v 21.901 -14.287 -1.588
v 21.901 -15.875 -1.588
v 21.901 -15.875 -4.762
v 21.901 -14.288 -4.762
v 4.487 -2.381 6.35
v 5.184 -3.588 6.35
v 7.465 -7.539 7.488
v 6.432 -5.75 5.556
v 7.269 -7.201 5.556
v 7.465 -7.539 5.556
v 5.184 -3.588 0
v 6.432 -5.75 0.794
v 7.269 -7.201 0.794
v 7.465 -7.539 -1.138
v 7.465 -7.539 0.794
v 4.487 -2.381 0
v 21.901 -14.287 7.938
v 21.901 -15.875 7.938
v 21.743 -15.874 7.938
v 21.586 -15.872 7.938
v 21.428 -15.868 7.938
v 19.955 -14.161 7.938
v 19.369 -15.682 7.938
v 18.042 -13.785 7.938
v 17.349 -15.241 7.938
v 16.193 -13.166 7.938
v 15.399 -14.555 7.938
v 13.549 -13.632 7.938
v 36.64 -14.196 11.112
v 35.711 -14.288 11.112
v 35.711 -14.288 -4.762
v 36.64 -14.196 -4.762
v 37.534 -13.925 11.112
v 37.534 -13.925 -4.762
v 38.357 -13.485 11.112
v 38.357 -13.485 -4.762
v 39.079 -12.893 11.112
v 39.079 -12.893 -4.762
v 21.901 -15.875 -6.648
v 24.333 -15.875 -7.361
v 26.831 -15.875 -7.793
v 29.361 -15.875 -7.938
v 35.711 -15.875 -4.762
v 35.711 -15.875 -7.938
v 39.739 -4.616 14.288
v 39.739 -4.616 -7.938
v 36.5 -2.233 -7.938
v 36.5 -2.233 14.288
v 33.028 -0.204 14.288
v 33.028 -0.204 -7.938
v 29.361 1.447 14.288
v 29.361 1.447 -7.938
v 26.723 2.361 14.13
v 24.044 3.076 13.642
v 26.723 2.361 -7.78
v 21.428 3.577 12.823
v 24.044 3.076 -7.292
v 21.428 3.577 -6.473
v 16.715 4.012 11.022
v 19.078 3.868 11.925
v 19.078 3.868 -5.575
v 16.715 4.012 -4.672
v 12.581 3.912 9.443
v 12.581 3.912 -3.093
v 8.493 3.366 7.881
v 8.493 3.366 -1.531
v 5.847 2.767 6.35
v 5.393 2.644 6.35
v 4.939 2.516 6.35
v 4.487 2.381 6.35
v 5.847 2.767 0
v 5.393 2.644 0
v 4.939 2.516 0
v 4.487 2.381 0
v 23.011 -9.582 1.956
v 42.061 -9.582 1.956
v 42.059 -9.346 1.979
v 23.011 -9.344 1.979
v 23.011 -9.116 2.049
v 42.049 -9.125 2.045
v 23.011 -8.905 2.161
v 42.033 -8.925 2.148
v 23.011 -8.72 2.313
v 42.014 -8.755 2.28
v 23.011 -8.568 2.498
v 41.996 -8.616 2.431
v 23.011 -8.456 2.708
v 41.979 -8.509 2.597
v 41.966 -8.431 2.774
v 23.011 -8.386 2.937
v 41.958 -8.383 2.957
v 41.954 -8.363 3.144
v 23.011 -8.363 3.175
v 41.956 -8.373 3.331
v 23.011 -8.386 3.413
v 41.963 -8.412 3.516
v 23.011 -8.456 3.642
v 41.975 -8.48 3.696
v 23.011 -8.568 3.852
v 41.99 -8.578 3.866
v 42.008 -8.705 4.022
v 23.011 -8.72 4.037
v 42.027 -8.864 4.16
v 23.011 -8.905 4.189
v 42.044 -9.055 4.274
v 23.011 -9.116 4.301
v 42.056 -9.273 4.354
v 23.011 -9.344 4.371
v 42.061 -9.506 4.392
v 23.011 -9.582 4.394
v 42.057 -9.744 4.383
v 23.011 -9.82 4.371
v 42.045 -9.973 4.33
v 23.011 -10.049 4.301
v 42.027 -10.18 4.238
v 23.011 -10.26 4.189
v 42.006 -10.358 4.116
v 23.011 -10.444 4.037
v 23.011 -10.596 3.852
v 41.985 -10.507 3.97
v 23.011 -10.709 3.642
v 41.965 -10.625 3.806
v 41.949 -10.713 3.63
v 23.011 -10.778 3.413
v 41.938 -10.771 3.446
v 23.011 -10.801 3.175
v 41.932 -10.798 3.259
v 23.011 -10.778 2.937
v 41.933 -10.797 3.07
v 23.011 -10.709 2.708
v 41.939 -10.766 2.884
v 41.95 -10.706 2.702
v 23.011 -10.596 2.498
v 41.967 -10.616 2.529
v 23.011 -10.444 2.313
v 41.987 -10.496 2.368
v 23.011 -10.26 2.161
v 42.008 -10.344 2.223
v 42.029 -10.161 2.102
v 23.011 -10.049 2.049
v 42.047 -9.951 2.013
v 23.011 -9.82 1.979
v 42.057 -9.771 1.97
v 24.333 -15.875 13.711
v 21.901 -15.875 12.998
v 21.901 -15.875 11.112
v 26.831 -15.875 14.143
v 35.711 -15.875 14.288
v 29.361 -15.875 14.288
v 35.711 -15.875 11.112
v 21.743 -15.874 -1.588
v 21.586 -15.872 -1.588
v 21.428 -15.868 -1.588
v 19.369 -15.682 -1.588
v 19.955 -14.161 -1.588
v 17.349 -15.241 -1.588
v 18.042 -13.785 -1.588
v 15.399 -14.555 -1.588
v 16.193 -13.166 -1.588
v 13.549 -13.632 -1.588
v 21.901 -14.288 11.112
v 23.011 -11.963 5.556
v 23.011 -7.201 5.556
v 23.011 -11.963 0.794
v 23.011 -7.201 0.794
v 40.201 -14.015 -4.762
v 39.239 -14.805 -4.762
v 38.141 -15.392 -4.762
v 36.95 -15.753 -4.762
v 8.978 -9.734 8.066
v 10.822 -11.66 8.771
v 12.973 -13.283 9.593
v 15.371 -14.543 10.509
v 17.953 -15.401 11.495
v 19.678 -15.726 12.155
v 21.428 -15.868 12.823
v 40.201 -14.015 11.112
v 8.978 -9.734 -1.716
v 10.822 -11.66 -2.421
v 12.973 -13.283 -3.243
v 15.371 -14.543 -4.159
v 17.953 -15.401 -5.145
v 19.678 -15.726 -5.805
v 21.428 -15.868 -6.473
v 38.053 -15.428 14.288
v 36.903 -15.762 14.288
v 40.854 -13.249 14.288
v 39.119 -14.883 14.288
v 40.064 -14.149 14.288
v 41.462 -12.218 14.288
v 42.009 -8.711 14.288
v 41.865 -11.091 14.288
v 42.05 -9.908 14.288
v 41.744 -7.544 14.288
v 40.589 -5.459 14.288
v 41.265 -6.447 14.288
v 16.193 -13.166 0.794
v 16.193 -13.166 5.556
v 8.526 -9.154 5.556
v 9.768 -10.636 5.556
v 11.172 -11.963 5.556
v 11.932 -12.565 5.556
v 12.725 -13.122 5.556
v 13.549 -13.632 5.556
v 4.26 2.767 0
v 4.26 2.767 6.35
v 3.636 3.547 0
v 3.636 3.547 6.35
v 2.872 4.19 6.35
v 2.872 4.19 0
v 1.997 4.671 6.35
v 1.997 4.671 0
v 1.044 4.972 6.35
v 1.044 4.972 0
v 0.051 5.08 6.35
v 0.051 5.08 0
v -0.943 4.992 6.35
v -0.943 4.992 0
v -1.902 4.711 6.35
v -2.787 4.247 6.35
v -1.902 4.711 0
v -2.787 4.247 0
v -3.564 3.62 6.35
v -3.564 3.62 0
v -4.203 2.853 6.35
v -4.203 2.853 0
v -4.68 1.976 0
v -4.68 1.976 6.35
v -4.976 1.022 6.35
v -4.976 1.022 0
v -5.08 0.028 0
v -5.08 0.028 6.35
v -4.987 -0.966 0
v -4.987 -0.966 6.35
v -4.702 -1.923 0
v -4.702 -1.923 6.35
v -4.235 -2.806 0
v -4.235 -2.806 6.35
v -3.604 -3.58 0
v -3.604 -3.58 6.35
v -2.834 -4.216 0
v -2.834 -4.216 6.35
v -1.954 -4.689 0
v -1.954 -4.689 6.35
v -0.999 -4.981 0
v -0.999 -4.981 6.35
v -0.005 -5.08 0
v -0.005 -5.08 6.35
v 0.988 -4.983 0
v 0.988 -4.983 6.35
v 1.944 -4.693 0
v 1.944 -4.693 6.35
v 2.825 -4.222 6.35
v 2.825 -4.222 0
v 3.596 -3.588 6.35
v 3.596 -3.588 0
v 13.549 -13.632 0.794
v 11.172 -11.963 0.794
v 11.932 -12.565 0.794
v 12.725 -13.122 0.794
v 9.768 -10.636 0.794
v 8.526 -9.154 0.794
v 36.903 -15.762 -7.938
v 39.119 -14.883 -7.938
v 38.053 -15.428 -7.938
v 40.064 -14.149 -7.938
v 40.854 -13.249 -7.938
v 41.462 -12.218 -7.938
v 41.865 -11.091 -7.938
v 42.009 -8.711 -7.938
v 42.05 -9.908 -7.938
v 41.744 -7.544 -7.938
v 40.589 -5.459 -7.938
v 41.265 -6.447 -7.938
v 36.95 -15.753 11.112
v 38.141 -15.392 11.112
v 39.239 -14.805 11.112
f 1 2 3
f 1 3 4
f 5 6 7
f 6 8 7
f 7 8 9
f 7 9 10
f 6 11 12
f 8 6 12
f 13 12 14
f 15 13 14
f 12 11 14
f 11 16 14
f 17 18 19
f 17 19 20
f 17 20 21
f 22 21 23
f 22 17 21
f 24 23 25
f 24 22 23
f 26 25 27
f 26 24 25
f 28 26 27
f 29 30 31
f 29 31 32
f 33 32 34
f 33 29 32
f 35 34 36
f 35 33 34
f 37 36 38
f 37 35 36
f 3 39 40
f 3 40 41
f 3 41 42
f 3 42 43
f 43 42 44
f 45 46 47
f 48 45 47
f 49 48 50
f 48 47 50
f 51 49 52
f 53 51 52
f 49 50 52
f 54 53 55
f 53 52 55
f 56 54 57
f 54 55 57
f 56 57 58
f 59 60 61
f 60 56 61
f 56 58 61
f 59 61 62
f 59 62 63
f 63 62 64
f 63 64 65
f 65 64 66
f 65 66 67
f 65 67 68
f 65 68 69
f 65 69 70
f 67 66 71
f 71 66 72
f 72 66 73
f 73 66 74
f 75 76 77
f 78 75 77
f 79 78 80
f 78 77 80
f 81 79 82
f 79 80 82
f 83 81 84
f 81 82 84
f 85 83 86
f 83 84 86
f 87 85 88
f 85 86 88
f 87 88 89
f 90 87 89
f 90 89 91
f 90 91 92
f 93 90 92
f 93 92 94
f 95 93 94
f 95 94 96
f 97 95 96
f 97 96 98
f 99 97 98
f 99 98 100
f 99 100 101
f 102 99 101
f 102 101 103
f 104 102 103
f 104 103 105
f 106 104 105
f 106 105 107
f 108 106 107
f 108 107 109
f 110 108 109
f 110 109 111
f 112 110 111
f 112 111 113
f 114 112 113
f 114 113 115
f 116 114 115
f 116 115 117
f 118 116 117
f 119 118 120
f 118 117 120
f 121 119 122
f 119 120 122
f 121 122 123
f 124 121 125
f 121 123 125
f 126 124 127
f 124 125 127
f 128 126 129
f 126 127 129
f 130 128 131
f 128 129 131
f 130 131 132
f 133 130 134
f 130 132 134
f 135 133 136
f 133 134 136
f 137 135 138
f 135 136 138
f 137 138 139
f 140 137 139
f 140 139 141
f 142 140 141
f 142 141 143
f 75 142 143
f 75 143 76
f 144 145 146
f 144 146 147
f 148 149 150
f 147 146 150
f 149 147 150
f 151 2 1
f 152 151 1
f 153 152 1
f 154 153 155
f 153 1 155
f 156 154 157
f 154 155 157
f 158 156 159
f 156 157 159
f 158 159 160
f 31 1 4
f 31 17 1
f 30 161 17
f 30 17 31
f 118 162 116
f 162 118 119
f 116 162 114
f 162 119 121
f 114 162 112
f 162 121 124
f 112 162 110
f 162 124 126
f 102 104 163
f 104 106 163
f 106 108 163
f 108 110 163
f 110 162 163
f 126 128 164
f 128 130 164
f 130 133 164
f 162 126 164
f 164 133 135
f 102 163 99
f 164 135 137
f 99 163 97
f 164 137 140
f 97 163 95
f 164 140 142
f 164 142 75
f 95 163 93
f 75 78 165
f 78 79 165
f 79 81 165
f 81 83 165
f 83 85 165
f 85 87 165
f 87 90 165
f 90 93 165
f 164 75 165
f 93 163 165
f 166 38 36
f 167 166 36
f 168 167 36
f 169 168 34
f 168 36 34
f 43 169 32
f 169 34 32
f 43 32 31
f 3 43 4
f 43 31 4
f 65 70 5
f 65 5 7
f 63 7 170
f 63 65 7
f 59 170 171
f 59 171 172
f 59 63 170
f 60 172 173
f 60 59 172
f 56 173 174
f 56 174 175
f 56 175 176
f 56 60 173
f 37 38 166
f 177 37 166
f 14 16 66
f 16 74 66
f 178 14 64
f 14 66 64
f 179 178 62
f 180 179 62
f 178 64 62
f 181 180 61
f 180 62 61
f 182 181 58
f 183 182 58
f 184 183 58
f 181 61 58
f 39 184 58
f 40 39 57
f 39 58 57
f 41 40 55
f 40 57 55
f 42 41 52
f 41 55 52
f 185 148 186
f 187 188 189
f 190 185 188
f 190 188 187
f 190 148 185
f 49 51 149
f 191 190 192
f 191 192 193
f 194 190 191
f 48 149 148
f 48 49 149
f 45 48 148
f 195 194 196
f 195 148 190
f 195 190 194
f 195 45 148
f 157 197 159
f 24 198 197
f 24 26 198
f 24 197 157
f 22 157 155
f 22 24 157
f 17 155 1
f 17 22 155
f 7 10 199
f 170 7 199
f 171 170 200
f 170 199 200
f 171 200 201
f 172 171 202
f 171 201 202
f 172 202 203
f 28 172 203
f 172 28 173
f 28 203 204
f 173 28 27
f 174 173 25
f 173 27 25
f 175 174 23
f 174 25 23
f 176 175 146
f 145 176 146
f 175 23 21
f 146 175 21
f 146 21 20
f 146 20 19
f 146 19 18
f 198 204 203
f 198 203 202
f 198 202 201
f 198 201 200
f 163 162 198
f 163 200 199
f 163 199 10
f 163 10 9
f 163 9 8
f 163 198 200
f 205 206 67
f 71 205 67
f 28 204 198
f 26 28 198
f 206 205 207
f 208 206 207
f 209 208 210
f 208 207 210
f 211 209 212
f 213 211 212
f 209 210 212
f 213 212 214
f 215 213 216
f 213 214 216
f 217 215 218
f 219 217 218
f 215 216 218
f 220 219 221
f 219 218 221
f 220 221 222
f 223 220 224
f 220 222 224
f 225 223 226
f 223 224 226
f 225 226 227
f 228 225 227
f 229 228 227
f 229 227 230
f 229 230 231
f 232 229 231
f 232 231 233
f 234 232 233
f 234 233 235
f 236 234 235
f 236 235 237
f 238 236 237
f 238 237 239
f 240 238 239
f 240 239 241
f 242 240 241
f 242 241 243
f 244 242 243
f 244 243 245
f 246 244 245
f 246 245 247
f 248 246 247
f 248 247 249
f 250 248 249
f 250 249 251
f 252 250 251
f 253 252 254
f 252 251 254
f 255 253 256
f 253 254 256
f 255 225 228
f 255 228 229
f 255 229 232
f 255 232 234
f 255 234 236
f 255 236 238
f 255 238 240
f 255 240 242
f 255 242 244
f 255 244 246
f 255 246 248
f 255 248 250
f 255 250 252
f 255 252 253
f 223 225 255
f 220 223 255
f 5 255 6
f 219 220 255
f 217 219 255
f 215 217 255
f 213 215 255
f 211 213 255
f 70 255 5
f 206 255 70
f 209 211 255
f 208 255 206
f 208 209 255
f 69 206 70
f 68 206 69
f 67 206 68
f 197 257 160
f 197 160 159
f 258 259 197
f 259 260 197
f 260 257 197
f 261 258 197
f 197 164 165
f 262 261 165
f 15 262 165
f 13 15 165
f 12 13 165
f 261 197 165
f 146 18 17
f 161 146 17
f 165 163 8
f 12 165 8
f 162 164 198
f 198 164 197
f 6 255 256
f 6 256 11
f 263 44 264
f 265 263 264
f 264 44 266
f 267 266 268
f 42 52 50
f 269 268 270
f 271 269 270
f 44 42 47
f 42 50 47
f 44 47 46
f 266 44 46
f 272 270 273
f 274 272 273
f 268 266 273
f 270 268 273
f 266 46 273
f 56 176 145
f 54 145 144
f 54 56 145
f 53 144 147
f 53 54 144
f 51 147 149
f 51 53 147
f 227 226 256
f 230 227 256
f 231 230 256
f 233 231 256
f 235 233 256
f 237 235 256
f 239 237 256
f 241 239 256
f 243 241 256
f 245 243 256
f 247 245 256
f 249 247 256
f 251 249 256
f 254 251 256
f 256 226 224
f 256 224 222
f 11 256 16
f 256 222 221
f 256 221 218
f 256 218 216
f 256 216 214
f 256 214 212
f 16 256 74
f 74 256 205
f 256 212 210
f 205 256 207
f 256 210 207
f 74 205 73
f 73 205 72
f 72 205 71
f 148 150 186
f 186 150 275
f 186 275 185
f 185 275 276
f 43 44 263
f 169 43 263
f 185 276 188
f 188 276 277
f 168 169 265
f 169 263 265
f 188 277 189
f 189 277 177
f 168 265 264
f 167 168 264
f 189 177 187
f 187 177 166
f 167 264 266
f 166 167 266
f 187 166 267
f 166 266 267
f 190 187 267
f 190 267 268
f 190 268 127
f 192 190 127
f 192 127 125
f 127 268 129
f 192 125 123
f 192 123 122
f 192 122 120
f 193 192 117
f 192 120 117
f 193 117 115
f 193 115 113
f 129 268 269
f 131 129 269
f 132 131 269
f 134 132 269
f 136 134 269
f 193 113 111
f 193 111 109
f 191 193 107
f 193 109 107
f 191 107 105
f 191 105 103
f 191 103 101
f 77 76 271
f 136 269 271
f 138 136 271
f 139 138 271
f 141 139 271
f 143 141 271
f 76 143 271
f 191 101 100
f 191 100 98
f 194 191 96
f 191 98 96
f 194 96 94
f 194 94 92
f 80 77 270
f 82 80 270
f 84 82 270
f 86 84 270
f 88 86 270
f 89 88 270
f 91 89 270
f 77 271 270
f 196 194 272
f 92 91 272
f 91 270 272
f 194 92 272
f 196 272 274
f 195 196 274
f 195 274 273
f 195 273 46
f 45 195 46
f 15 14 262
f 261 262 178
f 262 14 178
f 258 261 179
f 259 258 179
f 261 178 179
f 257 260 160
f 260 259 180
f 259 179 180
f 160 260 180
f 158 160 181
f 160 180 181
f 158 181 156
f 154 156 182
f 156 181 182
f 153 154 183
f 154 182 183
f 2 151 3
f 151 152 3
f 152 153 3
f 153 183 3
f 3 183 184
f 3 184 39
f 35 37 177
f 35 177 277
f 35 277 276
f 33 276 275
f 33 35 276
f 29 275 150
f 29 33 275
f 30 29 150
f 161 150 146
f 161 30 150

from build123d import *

# Parameters (mm, degrees)
BOSS_EXTRUDE1_DEPTH             = 6.35
BOSS_EXTRUDE3_START             = -7.9375
BOSS_EXTRUDE3_DEPTH             = 22.225
CUT_EXTRUDE4_DEPTH              = 6.08
CUT_EXTRUDE4_DEPTH_BACK         = 16.875
CUT_EXTRUDE10_START             = -19.05
SKETCH16_W                      = 4.7625
SKETCH16_H                      = 4.7625
CUT_EXTRUDE10_DEPTH             = 29.091259281
CUT_EXTRUDE11_REACH             = 13.113
CUT_EXTRUDE11_DIRECTION_2_REACH = 13.113
F_2_CLEARANCE_HOLE1_D           = 2.4384
BOSS_EXTRUDE19_DEPTH            = 6.35
CUT_EXTRUDE12_DEPTH             = 4.7625
CUT_EXTRUDE12_DEPTH_BACK        = 4.7625
CUT_EXTRUDE13_DEPTH             = 3.175
CUT_EXTRUDE14_START             = 9.525
CUT_EXTRUDE14_DEPTH             = 3.175


with BuildPart() as part:
    # Sketch2 → Boss-Extrude1 (new body)
    with BuildSketch(Plane.XY):
        with BuildLine():
            Line((4.487320853, -2.38125), (4.487320853, 2.38125))
            ThreePointArc((4.487320853, 2.38125), (-5.08, 0), (4.487320853, -2.38125))
        make_face()
    extrude(amount=BOSS_EXTRUDE1_DEPTH)

    # Sketch3 → Boss-Extrude3 (add)
    with BuildSketch(Plane.XY.offset(BOSS_EXTRUDE3_START)):
        with BuildLine():
            Line((4.487320853, 2.38125), (4.487320853, -2.38125))
            Line((4.487320853, -2.38125), (7.464780529, -7.539384784))
            ThreePointArc((7.464780529, -7.539384784), (13.566062361, -13.641452925), (21.901057446, -15.875))
            Line((21.901057446, -15.875), (35.711259281, -15.875))
            ThreePointArc((35.711259281, -15.875), (41.690195135, -11.663884303), (39.7390552, -4.615890098))
            ThreePointArc((39.7390552, -4.615890098), (22.990060642, 3.300382048), (4.487320853, 2.38125))
        make_face()
    extrude(amount=BOSS_EXTRUDE3_DEPTH)

    # Sketch14 → Cut-Extrude4 (cut, two sides)
    with BuildSketch(Plane(origin=(0, 0, 0), x_dir=(1, 0, 0), z_dir=(0, 1, 0))) as cut_extrude4_sk:
        with BuildLine():
            Line((4.487320853, -6.35), (21.428093277, -12.823412845))
            ThreePointArc((21.428093277, -12.823412845), (25.327691566, -13.918413536), (29.361259281, -14.2875))
            Line((29.361259281, -14.2875), (4.487320853, -14.2875))
            Line((4.487320853, -14.2875), (4.487320853, -6.35))
        make_face()
        with BuildLine():
            Line((4.487320853, 0), (21.428093277, 6.473412845))
            ThreePointArc((21.428093277, 6.473412845), (25.327691566, 7.568413536), (29.361259281, 7.9375))
            Line((29.361259281, 7.9375), (4.487320853, 7.9375))
            Line((4.487320853, 7.9375), (4.487320853, 0))
        make_face()
    extrude(amount=CUT_EXTRUDE4_DEPTH, mode=Mode.SUBTRACT)
    extrude(cut_extrude4_sk.sketch, amount=-CUT_EXTRUDE4_DEPTH_BACK, mode=Mode.SUBTRACT)

    # Sketch16 → Cut-Extrude10 (cut, through all)
    with BuildSketch(Plane(origin=(42.061259281, 0, 0), x_dir=(0, 0, -1), z_dir=(1, 0, 0)).offset(CUT_EXTRUDE10_START)):
        with Locations((-3.175, -9.58215)):
            Rectangle(SKETCH16_W, SKETCH16_H)
    extrude(amount=-CUT_EXTRUDE10_DEPTH, mode=Mode.SUBTRACT)

    # Cut-Extrude11: up to this face of the body (flat: up to its plane)
    cut_extrude11_end = Plane(part.part.faces().sort_by_distance((15.949219939, -9.473187723, 5.55625))[0])
    # Sketch29 → Cut-Extrude11 (cut, up to the picked face)
    with BuildSketch(Plane(origin=(0, 0, 3.175), x_dir=(-1, 0, 0), z_dir=(0, 0, -1)), mode=Mode.PRIVATE) as cut_extrude11_sk1:
        Polygon((-7.269395019, -7.2009), (-23.011259281, -7.2009), (-6.432122374, -5.75041347), align=None)
    cut_extrude11_tool1 = split(extrude(cut_extrude11_sk1.sketch, amount=-CUT_EXTRUDE11_REACH, mode=Mode.PRIVATE), bisect_by=cut_extrude11_end, keep=Keep.BOTH, mode=Mode.PRIVATE)
    add(cut_extrude11_tool1.solids().sort_by_distance((12.237592, -6.717404, 3.175))[0], mode=Mode.SUBTRACT)
    # Sketch29 → Cut-Extrude11 (cut, up to the picked face)
    with BuildSketch(Plane(origin=(0, 0, 3.175), x_dir=(-1, 0, 0), z_dir=(0, 0, -1)), mode=Mode.PRIVATE) as cut_extrude11_sk2:
        with BuildLine():
            Line((-23.011259281, -11.9634), (-13.549349632, -13.63178996))
            ThreePointArc((-13.549349632, -13.63178996), (-12.324513592, -12.849454696), (-11.172481099, -11.9634))
            Line((-11.172481099, -11.9634), (-23.011259281, -11.9634))
        make_face()
    cut_extrude11_tool2 = split(extrude(cut_extrude11_sk2.sketch, amount=-CUT_EXTRUDE11_REACH, mode=Mode.PRIVATE), bisect_by=cut_extrude11_end, keep=Keep.BOTH, mode=Mode.PRIVATE)
    add(cut_extrude11_tool2.solids().sort_by_distance((15.867281, -12.523197, 3.175))[0], mode=Mode.SUBTRACT)

    # Cut-Extrude11 direction 2: up to this face of the body (flat: up to its plane)
    cut_extrude11_direction_2_end = Plane(part.part.faces().sort_by_distance((15.949219939, -9.473187723, 0.79375))[0])
    # Sketch29 → Cut-Extrude11 direction 2 (cut, up to the picked face)
    with BuildSketch(Plane(origin=(0, 0, 3.175), x_dir=(-1, 0, 0), z_dir=(0, 0, -1)), mode=Mode.PRIVATE) as cut_extrude11_direction_2_sk1:
        Polygon((-7.269395019, -7.2009), (-23.011259281, -7.2009), (-6.432122374, -5.75041347), align=None)
    cut_extrude11_direction_2_tool1 = split(extrude(cut_extrude11_direction_2_sk1.sketch, amount=CUT_EXTRUDE11_DIRECTION_2_REACH, mode=Mode.PRIVATE), bisect_by=cut_extrude11_direction_2_end, keep=Keep.BOTH, mode=Mode.PRIVATE)
    add(cut_extrude11_direction_2_tool1.solids().sort_by_distance((12.237592, -6.717404, 3.175))[0], mode=Mode.SUBTRACT)
    # Sketch29 → Cut-Extrude11 direction 2 (cut, up to the picked face)
    with BuildSketch(Plane(origin=(0, 0, 3.175), x_dir=(-1, 0, 0), z_dir=(0, 0, -1)), mode=Mode.PRIVATE) as cut_extrude11_direction_2_sk2:
        with BuildLine():
            Line((-23.011259281, -11.9634), (-13.549349632, -13.63178996))
            ThreePointArc((-13.549349632, -13.63178996), (-12.324513592, -12.849454696), (-11.172481099, -11.9634))
            Line((-11.172481099, -11.9634), (-23.011259281, -11.9634))
        make_face()
    cut_extrude11_direction_2_tool2 = split(extrude(cut_extrude11_direction_2_sk2.sketch, amount=CUT_EXTRUDE11_DIRECTION_2_REACH, mode=Mode.PRIVATE), bisect_by=cut_extrude11_direction_2_end, keep=Keep.BOTH, mode=Mode.PRIVATE)
    add(cut_extrude11_direction_2_tool2.solids().sort_by_distance((15.867281, -12.523197, 3.175))[0], mode=Mode.SUBTRACT)

    # 2 Clearance Hole1 (through all)
    with Locations(Plane.ZY.offset(-23.011259281)):
        with Locations((3.175, -9.58215)):
            Hole(F_2_CLEARANCE_HOLE1_D / 2)

    # Sketch25 → Boss-Extrude19 (add)
    with BuildSketch(Plane.XY.offset(6.35)):
        with BuildLine():
            Line((5.183826817, -3.587873106), (4.487320853, -2.38125))
            ThreePointArc((4.487320853, -2.38125), (4.086603081, -3.017627422), (3.596326817, -3.587873106))
            Line((3.596326817, -3.587873106), (5.183826817, -3.587873106))
        make_face()
        with BuildLine():
            Line((4.259998652, 2.767455779), (5.847498652, 2.767455779))
            ThreePointArc((5.847498652, 2.767455779), (5.165618018, 2.580663195), (4.487320853, 2.38125))
            ThreePointArc((4.487320853, 2.38125), (4.377920551, 2.576860812), (4.259998652, 2.767455779))
        make_face()
    extrude(amount=-BOSS_EXTRUDE19_DEPTH)

    # Sketch32 → Cut-Extrude12 (cut, two sides)
    with BuildSketch(Plane(origin=(0, 0, 3.175), x_dir=(-1, 0, 0), z_dir=(0, 0, -1))) as cut_extrude12_sk:
        with BuildLine():
            Line((-29.361259281, -15.875), (-21.901057446, -15.875))
            ThreePointArc((-21.901057446, -15.875), (-21.664551554, -15.873322074), (-21.428093277, -15.868288634))
            ThreePointArc((-21.428093277, -15.868288634), (-17.349223696, -15.24146238), (-13.549349632, -13.63178996))
            Line((-13.549349632, -13.63178996), (-16.19315137, -13.165616382))
            ThreePointArc((-16.19315137, -13.165616382), (-18.992500475, -14.004371432), (-21.901057446, -14.2875))
            Line((-21.901057446, -14.2875), (-35.711259281, -14.2875))
            ThreePointArc((-35.711259281, -14.2875), (-37.533789128, -13.924976274), (-39.078855326, -12.892596045))
            Line((-39.078855326, -12.892596045), (-40.201387342, -14.015128061))
            ThreePointArc((-40.201387342, -14.015128061), (-38.141299077, -15.391635031), (-35.711259281, -15.875))
            Line((-35.711259281, -15.875), (-29.361259281, -15.875))
        make_face()
    extrude(amount=CUT_EXTRUDE12_DEPTH, mode=Mode.SUBTRACT)
    extrude(cut_extrude12_sk.sketch, amount=-CUT_EXTRUDE12_DEPTH_BACK, mode=Mode.SUBTRACT)

    # Sketch33 → Cut-Extrude13 (cut)
    with BuildSketch(Plane(origin=(0, 0, 7.9375), x_dir=(-1, 0, 0), z_dir=(0, 0, -1))):
        with BuildLine():
            Line((-21.901057446, -15.875), (-21.901057446, -14.2875))
            Line((-21.901057446, -14.2875), (-35.711259281, -14.2875))
            ThreePointArc((-35.711259281, -14.2875), (-37.533789128, -13.924976274), (-39.078855326, -12.892596045))
            Line((-39.078855326, -12.892596045), (-40.201387342, -14.015128061))
            ThreePointArc((-40.201387342, -14.015128061), (-38.141299077, -15.391635031), (-35.711259281, -15.875))
            Line((-35.711259281, -15.875), (-21.901057446, -15.875))
        make_face()
    extrude(amount=-CUT_EXTRUDE13_DEPTH, mode=Mode.SUBTRACT)

    # Sketch33_2 → Cut-Extrude14 (cut)
    with BuildSketch(Plane(origin=(0, 0, 7.9375), x_dir=(-1, 0, 0), z_dir=(0, 0, -1)).offset(CUT_EXTRUDE14_START)):
        with BuildLine():
            Line((-35.711259281, -15.875), (-21.901057446, -15.875))
            Line((-21.901057446, -15.875), (-21.901057446, -14.2875))
            Line((-21.901057446, -14.2875), (-35.711259281, -14.2875))
            ThreePointArc((-35.711259281, -14.2875), (-37.533789128, -13.924976274), (-39.078855326, -12.892596045))
            Line((-39.078855326, -12.892596045), (-40.201387342, -14.015128061))
            ThreePointArc((-40.201387342, -14.015128061), (-38.141299077, -15.391635031), (-35.711259281, -15.875))
        make_face()
    extrude(amount=CUT_EXTRUDE14_DEPTH, mode=Mode.SUBTRACT)


solid = part.part
